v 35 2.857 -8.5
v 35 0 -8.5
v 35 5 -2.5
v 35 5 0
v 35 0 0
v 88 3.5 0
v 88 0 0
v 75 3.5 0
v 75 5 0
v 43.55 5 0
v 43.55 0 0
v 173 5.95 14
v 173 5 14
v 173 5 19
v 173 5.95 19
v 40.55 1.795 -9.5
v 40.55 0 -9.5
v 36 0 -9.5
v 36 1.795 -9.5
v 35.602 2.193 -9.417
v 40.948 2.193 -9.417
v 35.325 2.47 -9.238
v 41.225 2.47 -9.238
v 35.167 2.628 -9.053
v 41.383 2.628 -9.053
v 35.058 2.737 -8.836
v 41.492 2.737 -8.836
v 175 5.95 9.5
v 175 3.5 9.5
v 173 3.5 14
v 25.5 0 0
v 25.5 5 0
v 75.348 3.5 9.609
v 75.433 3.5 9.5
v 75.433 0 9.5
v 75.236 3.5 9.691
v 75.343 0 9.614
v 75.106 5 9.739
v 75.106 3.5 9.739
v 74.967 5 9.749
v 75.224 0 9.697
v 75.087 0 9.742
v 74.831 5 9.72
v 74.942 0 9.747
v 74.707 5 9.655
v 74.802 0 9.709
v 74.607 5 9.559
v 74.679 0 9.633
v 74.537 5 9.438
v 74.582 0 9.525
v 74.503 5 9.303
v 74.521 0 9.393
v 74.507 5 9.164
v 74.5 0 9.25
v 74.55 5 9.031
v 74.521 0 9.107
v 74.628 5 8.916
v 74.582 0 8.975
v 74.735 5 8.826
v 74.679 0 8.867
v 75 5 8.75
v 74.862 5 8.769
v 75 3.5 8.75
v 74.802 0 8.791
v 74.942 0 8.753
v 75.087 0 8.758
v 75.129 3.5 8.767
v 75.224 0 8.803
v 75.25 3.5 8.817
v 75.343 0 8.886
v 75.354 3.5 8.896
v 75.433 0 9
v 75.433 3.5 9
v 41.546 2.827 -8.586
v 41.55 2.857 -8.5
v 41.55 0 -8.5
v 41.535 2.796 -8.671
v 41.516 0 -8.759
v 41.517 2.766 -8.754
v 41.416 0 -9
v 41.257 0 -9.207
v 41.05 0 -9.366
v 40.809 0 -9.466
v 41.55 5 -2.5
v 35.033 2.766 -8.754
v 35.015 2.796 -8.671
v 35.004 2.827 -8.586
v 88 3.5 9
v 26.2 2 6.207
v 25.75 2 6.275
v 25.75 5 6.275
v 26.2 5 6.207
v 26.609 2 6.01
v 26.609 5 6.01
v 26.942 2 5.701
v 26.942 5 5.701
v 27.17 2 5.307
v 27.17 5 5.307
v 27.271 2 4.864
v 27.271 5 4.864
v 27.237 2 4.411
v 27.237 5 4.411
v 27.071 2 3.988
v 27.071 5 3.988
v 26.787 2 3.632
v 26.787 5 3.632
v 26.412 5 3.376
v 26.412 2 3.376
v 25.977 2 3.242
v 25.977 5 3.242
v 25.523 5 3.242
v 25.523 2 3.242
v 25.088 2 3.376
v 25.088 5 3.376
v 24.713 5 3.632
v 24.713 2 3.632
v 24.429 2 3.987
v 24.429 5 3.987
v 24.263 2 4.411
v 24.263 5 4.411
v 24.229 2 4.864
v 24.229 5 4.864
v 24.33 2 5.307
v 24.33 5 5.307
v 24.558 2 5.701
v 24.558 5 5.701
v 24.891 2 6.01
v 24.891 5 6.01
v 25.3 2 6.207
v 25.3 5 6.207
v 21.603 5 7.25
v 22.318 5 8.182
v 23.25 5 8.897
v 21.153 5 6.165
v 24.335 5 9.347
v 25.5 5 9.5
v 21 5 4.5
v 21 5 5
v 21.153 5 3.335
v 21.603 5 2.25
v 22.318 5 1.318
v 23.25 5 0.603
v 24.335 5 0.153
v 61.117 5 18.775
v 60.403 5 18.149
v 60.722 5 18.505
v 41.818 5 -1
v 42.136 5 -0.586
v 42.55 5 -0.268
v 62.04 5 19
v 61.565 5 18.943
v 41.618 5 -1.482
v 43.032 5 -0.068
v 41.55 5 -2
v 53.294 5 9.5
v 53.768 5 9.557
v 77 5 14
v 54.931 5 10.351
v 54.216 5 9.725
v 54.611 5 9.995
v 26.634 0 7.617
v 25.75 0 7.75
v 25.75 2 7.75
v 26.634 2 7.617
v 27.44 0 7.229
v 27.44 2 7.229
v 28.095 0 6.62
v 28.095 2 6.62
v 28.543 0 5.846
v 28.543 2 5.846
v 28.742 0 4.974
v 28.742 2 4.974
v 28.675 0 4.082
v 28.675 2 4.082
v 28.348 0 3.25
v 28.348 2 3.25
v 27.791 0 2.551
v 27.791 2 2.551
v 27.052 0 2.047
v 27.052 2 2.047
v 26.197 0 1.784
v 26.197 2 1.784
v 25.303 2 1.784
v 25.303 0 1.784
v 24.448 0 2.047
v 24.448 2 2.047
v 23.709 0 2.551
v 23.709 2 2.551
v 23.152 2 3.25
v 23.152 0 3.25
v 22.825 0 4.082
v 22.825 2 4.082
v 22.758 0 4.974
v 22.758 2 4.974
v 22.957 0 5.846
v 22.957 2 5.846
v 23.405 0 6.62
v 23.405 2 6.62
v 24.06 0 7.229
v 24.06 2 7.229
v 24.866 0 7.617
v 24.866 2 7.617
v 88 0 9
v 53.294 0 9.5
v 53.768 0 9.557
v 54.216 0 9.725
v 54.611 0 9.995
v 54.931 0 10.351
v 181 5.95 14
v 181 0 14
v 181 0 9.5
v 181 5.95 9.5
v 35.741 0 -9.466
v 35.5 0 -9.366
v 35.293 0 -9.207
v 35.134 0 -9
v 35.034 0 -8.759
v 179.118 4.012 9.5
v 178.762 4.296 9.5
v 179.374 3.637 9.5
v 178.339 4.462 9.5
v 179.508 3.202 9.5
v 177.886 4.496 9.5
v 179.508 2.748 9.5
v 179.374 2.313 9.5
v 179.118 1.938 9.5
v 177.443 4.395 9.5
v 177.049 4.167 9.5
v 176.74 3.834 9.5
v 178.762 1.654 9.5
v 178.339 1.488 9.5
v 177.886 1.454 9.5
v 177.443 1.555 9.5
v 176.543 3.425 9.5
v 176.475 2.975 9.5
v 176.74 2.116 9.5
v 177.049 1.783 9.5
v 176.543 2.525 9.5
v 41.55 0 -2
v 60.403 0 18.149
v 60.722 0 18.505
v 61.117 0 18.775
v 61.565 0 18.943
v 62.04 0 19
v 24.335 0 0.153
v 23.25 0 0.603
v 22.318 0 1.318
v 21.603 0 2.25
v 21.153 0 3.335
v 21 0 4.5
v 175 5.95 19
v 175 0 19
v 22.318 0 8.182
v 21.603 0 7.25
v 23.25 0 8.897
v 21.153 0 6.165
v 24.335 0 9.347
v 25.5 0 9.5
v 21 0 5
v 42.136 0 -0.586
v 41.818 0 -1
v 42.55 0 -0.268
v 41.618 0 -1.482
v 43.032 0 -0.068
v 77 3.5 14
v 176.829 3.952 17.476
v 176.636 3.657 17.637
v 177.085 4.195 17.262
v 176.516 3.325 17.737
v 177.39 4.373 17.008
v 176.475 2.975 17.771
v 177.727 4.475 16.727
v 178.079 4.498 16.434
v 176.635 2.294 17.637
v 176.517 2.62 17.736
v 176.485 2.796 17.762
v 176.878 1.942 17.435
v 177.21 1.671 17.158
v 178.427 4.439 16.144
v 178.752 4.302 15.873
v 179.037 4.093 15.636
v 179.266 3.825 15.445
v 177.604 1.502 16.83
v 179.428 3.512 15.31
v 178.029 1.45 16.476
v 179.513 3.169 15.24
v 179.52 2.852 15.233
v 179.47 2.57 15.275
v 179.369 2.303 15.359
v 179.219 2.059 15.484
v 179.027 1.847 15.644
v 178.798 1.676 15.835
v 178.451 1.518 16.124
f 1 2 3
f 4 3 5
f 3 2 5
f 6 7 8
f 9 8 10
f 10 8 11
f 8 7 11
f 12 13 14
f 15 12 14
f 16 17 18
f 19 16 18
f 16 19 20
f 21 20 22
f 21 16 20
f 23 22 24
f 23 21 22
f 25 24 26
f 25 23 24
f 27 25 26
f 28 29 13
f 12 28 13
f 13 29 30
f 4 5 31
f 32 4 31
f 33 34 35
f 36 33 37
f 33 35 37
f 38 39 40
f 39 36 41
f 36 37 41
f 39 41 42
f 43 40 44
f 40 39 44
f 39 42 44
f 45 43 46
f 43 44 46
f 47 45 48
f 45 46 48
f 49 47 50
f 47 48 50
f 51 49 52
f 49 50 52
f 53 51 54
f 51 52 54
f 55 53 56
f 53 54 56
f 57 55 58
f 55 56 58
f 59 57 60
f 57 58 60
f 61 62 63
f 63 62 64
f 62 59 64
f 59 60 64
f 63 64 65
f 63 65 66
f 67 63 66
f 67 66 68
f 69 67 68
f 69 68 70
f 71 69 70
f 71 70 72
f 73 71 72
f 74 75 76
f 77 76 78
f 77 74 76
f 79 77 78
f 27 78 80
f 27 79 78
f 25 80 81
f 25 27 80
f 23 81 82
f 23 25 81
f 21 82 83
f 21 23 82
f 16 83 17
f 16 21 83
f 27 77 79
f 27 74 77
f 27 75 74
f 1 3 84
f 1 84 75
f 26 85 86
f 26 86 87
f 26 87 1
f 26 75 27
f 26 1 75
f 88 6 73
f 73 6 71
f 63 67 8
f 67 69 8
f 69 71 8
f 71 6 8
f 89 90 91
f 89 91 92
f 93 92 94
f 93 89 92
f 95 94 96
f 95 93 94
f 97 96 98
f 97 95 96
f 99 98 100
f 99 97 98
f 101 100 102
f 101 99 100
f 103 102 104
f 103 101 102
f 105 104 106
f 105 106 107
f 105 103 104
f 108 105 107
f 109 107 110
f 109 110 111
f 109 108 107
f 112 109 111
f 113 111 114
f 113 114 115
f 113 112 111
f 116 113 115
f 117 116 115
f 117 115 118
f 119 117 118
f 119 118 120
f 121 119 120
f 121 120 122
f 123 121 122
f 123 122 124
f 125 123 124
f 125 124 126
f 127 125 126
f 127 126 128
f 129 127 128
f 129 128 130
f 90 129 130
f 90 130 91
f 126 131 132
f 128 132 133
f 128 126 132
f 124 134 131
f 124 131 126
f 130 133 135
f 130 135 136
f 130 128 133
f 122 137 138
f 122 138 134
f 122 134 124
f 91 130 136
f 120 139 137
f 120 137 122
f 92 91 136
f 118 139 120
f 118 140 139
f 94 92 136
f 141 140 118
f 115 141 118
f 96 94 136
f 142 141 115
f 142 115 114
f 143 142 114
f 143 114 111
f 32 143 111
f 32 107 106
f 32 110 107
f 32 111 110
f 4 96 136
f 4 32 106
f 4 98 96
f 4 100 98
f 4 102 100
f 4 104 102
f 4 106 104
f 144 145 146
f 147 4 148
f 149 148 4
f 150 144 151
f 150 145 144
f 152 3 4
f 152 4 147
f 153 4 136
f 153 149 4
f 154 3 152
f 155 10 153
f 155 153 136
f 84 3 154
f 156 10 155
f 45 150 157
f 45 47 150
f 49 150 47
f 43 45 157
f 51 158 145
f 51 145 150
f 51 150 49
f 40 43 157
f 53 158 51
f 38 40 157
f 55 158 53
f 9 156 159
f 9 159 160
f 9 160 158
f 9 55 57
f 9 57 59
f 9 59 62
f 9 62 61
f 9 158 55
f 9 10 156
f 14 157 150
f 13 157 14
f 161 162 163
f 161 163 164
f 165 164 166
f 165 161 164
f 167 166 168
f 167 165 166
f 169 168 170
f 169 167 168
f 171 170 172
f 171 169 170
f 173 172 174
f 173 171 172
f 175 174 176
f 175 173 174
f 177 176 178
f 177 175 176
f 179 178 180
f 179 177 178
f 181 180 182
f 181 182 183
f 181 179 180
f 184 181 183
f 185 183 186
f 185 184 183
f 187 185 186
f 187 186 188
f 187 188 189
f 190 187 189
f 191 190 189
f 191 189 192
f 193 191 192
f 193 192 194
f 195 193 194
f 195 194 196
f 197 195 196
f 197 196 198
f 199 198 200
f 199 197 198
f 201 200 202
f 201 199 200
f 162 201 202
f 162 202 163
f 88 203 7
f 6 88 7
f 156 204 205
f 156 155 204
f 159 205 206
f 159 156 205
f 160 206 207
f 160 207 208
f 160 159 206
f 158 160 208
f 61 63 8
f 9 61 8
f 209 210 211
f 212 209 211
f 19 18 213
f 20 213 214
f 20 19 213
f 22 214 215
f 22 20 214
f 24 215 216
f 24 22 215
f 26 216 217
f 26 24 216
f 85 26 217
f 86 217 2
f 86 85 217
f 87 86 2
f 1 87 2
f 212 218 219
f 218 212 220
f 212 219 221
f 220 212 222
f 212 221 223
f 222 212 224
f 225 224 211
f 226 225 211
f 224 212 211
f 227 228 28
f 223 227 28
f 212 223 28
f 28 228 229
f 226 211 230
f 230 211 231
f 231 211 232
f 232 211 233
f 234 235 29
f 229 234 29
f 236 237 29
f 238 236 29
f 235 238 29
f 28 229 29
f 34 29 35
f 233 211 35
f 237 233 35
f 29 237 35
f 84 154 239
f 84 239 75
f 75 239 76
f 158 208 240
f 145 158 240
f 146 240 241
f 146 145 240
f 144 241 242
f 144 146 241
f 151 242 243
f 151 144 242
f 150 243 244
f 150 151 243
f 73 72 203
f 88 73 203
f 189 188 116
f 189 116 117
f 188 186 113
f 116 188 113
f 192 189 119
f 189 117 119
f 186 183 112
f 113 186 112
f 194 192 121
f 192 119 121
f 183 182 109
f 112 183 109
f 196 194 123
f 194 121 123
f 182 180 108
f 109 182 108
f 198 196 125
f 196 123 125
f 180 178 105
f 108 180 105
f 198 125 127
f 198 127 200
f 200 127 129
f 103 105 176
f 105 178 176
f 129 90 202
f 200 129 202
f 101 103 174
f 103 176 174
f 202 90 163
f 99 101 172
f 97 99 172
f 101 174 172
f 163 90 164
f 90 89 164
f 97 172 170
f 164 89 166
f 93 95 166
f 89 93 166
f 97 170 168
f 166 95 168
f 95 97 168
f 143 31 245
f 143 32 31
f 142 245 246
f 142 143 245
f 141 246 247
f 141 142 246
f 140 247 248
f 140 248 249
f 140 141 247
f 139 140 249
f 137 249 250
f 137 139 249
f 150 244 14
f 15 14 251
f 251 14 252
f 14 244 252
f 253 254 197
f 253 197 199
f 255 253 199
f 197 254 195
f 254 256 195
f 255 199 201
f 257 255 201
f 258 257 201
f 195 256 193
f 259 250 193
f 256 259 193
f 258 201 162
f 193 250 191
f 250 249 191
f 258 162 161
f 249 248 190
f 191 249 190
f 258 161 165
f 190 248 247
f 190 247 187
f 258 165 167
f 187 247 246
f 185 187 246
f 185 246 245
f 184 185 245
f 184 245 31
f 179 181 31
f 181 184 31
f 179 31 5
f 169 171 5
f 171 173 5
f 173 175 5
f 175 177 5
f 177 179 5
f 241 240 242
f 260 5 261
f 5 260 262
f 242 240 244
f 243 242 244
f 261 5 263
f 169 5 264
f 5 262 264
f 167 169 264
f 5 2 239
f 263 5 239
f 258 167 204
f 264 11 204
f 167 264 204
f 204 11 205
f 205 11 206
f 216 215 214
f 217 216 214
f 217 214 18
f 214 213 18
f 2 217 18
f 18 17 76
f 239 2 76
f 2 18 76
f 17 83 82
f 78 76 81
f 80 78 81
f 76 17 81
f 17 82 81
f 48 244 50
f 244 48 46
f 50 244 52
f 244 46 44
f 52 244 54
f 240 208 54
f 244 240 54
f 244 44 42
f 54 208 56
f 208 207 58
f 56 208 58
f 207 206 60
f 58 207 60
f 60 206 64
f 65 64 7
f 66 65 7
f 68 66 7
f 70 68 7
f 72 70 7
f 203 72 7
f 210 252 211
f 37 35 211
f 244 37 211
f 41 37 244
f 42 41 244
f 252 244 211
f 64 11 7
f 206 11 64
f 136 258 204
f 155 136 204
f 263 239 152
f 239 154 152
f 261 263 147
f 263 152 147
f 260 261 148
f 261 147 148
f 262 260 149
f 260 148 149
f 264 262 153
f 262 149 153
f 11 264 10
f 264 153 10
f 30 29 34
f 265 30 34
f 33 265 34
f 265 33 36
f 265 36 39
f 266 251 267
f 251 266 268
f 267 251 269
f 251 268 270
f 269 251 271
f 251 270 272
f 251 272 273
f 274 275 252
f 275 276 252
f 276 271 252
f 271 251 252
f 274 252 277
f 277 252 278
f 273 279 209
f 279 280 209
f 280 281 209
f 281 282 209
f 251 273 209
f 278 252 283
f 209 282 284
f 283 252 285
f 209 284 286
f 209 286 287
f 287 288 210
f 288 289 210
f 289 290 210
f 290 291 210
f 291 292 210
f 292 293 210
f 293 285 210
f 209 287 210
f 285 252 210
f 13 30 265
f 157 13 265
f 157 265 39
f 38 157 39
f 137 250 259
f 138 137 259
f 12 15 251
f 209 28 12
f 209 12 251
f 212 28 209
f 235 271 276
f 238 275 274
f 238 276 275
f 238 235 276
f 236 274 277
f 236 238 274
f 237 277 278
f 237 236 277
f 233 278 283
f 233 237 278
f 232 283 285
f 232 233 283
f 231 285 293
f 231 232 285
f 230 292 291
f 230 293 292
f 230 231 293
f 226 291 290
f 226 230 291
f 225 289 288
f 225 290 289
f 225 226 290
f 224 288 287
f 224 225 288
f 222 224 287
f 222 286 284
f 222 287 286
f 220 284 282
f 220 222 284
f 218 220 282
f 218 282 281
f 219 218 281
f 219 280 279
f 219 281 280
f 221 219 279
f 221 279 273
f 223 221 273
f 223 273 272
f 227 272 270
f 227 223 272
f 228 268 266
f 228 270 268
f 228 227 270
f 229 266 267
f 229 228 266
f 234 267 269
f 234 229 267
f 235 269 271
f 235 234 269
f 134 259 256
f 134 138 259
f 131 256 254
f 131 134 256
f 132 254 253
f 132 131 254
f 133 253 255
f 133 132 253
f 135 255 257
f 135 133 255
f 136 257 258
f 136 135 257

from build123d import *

# Parameters (mm, degrees)
SKETCH_1_R          = 1.525
EXTRUDE_1_DEPTH     = 5
CUT_EXTRUDE_START   = 3.5
CUT_EXTRUDE_1_DEPTH = 179.563175848
SKETCH_3_R          = 3
CUT_EXTRUDE_2_DEPTH = 2
EXTRUDE_2_DEPTH     = 5.95
SKETCH_7_R          = 1.525
CUT_EXTRUDE_3_DEPTH = 183.091741987
FILLET_4_R          = 4.5
CUT_EXTRUDE_4_DEPTH = 183.091741987
FILLET_5_R          = 2
FILLET_6_R          = 1


with BuildPart() as part:
    # 草图1 → 凸台-拉伸1 (new body)
    with BuildSketch(Plane(origin=(0, 0, 0), x_dir=(1, 0, 0), z_dir=(0, 1, 0))):
        with BuildLine():
            Line((21, 0), (21, -9.5))
            Line((21, -9.5), (54.333333333, -9.5))
            Line((54.333333333, -9.5), (61, -19))
            Line((61, -19), (65, -19))
            Line((65, -19), (175, -19))
            Line((175, -19), (181, -14))
            Line((181, -14), (181, -9.5))
            Line((181, -9.5), (75.433012702, -9.5))
            ThreePointArc((75.433012702, -9.5), (74.5, -9.25), (75.433012702, -9))
            Line((75.433012702, -9), (88, -9))
            Line((88, -9), (88, 0))
            Line((88, 0), (41.55, 0))
            Line((41.55, 0), (41.55, 9.5))
            Line((41.55, 9.5), (35, 9.5))
            Line((35, 9.5), (35, 0))
            Line((35, 0), (21, 0))
        make_face()
        with Locations(Location((25.75, -4.75, 0), (0, 0, 270))):
            Circle(SKETCH_1_R, mode=Mode.SUBTRACT)
    extrude(amount=EXTRUDE_1_DEPTH)

    # 草图2 → 切除-拉伸1 (cut, through all)
    with BuildSketch(Plane(origin=(0, 0, 0), x_dir=(1, 0, 0), z_dir=(0, 1, 0)).offset(CUT_EXTRUDE_START)):
        Polygon((75, -9), (75, 0), (88, 0), (88, -9), (75.433012702, -9), align=None)
        Polygon((75.433012702, -9.5), (175, -9.5), (173, -14), (77, -14), (75, -9.5), align=None)
    extrude(amount=CUT_EXTRUDE_1_DEPTH, mode=Mode.SUBTRACT)

    # 草图3 → 切除-拉伸2 (cut)
    with BuildSketch(Plane(origin=(0, 0, 0), x_dir=(1, 0, 0), z_dir=(0, 1, 0))):
        with Locations(Location((25.75, -4.75, 0), (0, 0, 270))):
            Circle(SKETCH_3_R)
    extrude(amount=CUT_EXTRUDE_2_DEPTH, mode=Mode.SUBTRACT)

    # 草图6 → 凸台-拉伸2 (add)
    with BuildSketch(Plane(origin=(0, 0, 0), x_dir=(1, 0, 0), z_dir=(0, 1, 0))):
        Polygon((173, -14), (173, -19), (175, -19), (181, -14), (181, -9.5), (175, -9.5), align=None)
    extrude(amount=EXTRUDE_2_DEPTH)

    # 草图7 → 切除-拉伸3 (cut, through all)
    with BuildSketch(Plane.XY):
        with Locations(Location((178, 2.975, 0), (0, 0, 180))):
            Circle(SKETCH_7_R)
    extrude(amount=CUT_EXTRUDE_3_DEPTH, mode=Mode.SUBTRACT)

    # 圆角4
    fillet_4_edges = [part.edges().sort_by_distance(p)[0] for p in [
        (21, 2.5, 9.5),
        (21, 2.5, 0),
    ]]
    fillet(fillet_4_edges, radius=FILLET_4_R)

    # 草图8 → 切除-拉伸4 (cut, through all)
    with BuildSketch(Plane(origin=(0, 0, 0), x_dir=(0, 0, -1), z_dir=(1, 0, 0))):
        Polygon((2.5, 5), (9.5, 2.5), (9.5, 5), align=None)
    extrude(amount=CUT_EXTRUDE_4_DEPTH, mode=Mode.SUBTRACT)

    # 圆角5
    fillet_5_edges = [part.edges().sort_by_distance(p)[0] for p in [
        (61, 2.5, 19),
        (54.333333333, 2.5, 9.5),
        (41.55, 2.5, 0),
    ]]
    fillet(fillet_5_edges, radius=FILLET_5_R)

    # 圆角6
    fillet_6_edges = [part.edges().sort_by_distance(p)[0] for p in [
        (35, 1.25, -9.5),
        (41.55, 1.25, -9.5),
        (38.275, 2.5, -9.5),
    ]]
    fillet(fillet_6_edges, radius=FILLET_6_R)


solid = part.part
